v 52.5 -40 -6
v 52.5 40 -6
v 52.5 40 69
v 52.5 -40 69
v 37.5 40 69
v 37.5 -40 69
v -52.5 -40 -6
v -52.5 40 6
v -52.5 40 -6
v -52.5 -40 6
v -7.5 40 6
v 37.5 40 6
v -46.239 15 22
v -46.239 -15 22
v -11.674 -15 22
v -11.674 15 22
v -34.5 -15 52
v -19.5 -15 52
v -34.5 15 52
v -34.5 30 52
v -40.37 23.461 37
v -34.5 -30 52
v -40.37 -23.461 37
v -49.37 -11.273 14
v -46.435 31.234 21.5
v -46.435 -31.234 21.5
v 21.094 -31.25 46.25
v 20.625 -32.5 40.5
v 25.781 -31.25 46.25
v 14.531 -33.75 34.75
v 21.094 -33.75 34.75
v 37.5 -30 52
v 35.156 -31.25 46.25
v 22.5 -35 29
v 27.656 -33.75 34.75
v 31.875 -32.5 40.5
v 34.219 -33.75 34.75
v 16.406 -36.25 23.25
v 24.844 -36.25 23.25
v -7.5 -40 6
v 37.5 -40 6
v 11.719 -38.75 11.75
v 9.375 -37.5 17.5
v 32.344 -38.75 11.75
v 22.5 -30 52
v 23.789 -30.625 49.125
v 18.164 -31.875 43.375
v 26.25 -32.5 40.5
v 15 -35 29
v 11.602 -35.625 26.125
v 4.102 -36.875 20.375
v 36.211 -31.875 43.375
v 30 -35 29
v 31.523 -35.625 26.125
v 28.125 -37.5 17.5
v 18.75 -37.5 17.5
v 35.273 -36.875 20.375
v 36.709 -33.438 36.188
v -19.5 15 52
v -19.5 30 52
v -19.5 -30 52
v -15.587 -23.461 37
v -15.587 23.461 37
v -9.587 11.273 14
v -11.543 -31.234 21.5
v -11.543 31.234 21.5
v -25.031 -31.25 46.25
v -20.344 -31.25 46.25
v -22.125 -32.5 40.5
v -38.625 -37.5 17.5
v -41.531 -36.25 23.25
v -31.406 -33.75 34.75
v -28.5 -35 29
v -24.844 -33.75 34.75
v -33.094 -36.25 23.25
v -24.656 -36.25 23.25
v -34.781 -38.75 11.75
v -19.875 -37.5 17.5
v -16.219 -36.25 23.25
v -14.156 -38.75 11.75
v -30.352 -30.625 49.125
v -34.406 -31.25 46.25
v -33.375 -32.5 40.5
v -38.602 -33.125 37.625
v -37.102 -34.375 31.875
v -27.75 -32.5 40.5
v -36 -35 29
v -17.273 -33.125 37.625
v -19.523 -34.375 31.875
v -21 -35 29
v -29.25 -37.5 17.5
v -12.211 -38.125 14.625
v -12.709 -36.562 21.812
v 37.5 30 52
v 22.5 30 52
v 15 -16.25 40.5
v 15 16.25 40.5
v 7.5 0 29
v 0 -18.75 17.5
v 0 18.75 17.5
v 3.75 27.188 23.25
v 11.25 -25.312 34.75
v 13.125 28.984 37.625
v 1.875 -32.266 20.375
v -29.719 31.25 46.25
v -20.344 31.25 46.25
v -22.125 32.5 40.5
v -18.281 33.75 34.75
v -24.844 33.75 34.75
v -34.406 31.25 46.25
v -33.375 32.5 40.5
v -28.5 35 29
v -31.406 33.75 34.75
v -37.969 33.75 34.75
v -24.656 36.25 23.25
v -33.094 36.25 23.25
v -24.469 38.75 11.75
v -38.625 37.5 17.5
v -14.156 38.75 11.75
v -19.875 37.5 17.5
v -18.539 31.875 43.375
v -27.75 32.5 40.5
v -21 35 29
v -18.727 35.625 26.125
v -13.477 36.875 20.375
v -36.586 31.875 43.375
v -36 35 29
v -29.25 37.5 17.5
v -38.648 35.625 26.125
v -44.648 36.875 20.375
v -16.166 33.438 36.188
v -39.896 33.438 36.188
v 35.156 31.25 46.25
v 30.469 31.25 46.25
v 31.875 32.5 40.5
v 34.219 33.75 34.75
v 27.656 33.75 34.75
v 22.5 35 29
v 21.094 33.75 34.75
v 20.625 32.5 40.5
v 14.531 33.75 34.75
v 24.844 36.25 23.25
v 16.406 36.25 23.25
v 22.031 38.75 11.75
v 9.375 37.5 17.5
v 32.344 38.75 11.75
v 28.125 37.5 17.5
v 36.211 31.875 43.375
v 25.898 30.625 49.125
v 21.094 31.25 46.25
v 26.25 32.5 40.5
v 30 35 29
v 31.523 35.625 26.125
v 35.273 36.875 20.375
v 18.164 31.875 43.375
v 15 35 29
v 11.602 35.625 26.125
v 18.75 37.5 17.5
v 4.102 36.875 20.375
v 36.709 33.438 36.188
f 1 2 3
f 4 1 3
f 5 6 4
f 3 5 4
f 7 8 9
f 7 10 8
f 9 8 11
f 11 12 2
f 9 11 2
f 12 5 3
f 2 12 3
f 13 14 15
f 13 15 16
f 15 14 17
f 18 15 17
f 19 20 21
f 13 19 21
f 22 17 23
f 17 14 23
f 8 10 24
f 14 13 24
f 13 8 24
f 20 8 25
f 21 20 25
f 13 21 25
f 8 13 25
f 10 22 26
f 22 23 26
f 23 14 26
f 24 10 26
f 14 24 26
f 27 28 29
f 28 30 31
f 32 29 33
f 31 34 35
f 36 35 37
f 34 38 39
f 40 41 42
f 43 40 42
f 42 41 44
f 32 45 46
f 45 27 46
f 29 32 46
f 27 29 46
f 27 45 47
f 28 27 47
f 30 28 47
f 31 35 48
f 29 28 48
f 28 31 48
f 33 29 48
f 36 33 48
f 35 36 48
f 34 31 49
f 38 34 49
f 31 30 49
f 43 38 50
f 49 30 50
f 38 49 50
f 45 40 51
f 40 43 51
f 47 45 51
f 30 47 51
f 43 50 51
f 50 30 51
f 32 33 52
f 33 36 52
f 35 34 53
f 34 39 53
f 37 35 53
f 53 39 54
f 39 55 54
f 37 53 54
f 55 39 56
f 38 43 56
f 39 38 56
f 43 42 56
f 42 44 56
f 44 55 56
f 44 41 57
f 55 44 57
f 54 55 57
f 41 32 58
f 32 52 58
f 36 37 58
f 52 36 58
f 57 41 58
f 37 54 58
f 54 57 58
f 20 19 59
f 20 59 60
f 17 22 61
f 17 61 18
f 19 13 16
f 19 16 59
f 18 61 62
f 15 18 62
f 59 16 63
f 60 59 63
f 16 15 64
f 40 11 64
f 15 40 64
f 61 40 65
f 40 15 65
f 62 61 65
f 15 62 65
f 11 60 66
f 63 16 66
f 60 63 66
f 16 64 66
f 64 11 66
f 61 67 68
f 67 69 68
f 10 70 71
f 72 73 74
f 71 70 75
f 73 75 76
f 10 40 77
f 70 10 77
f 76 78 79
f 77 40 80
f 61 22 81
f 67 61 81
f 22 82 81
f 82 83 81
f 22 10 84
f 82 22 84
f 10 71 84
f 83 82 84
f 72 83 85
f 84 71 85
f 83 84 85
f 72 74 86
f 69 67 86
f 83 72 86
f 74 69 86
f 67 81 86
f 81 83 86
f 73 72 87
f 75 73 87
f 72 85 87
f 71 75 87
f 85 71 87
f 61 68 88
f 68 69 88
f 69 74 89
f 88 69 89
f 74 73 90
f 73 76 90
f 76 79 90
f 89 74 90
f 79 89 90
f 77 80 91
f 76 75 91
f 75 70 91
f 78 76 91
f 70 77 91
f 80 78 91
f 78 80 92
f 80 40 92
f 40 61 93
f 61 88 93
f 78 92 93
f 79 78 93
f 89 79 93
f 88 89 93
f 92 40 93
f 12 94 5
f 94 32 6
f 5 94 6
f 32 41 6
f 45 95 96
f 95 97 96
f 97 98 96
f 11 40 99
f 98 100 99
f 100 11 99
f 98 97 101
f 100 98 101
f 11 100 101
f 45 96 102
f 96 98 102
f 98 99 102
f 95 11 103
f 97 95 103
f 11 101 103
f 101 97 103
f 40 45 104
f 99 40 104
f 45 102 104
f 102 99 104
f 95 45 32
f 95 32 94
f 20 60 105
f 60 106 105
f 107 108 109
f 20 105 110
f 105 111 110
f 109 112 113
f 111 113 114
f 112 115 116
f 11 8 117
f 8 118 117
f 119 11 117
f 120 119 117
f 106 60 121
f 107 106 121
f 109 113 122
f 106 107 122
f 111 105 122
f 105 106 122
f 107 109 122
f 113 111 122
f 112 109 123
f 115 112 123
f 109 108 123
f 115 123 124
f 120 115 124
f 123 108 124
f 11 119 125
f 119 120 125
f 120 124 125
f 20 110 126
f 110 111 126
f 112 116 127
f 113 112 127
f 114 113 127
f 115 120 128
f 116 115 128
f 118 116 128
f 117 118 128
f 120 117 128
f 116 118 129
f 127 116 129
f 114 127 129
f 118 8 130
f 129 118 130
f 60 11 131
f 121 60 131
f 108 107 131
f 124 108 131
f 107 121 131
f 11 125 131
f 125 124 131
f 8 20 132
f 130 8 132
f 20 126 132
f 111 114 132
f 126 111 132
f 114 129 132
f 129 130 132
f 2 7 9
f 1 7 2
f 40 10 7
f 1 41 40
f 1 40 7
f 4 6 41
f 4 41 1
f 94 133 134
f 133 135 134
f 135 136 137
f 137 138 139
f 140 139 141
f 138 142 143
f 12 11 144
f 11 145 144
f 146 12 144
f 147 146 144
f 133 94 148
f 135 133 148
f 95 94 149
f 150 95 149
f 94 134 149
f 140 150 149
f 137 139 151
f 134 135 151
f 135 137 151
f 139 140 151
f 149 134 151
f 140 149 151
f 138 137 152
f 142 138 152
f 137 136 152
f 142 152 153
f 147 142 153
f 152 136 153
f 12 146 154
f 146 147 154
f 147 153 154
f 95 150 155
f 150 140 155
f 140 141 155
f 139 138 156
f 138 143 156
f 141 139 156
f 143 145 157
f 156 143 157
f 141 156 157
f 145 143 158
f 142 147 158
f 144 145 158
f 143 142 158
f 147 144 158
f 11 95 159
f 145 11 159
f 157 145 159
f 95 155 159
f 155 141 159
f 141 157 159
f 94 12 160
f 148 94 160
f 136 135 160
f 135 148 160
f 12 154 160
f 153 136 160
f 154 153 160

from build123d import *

# Parameters (mm, degrees)
F0_W      = 15
F0_H      = 63
F1_DEPTH  = 40
F4_W      = 15
F4_H      = 60
F2_W      = 45
F2_H      = 80
F1_FACE_W = 45
F1_FACE_H = 80
F8_W      = 30
F8_H      = 30
F9_DEPTH  = 50


with BuildPart() as f1:
    # F0 (on Front) → F1 (new body, symmetric)
    with BuildSketch(Plane.XZ):
        Polygon((-52.5, -6), (52.5, -6), (52.5, 6), (37.5, 6), (-52.5, 6), align=None)
        with Locations((45, 37.5)):
            Rectangle(F0_W, F0_H)
    extrude(amount=F1_DEPTH, both=True)

    # F4 (on offset) → F5 section 0
    with BuildSketch(Plane.XY.offset(52)):
        with Locations((-27, 0)):
            Rectangle(F4_W, F4_H)
    # F2 (on face) → F5 section 1
    with BuildSketch(Plane.XY.offset(6)):
        with Locations((-30, 0)):
            Rectangle(F2_W, F2_H)
    loft()

    # F4 (on offset) → F6 section 0
    with BuildSketch(Plane.XY.offset(52)):
        with Locations((30, 0)):
            Rectangle(F4_W, F4_H)
    # F1_face (on face) → F6 section 1
    with BuildSketch(Plane(origin=(-7.5, 0, 6), x_dir=(1, 0, 0), z_dir=(0, 0, 1))):
        with Locations((22.5, 0)):
            Rectangle(F1_FACE_W, F1_FACE_H)
    loft()

    # F8 (on offset) → F9 (cut)
    with BuildSketch(Plane.YZ.offset(-52.5)):
        with Locations((0, 37)):
            Rectangle(F8_W, F8_H)
    extrude(amount=F9_DEPTH, mode=Mode.SUBTRACT)


solid = f1.part
